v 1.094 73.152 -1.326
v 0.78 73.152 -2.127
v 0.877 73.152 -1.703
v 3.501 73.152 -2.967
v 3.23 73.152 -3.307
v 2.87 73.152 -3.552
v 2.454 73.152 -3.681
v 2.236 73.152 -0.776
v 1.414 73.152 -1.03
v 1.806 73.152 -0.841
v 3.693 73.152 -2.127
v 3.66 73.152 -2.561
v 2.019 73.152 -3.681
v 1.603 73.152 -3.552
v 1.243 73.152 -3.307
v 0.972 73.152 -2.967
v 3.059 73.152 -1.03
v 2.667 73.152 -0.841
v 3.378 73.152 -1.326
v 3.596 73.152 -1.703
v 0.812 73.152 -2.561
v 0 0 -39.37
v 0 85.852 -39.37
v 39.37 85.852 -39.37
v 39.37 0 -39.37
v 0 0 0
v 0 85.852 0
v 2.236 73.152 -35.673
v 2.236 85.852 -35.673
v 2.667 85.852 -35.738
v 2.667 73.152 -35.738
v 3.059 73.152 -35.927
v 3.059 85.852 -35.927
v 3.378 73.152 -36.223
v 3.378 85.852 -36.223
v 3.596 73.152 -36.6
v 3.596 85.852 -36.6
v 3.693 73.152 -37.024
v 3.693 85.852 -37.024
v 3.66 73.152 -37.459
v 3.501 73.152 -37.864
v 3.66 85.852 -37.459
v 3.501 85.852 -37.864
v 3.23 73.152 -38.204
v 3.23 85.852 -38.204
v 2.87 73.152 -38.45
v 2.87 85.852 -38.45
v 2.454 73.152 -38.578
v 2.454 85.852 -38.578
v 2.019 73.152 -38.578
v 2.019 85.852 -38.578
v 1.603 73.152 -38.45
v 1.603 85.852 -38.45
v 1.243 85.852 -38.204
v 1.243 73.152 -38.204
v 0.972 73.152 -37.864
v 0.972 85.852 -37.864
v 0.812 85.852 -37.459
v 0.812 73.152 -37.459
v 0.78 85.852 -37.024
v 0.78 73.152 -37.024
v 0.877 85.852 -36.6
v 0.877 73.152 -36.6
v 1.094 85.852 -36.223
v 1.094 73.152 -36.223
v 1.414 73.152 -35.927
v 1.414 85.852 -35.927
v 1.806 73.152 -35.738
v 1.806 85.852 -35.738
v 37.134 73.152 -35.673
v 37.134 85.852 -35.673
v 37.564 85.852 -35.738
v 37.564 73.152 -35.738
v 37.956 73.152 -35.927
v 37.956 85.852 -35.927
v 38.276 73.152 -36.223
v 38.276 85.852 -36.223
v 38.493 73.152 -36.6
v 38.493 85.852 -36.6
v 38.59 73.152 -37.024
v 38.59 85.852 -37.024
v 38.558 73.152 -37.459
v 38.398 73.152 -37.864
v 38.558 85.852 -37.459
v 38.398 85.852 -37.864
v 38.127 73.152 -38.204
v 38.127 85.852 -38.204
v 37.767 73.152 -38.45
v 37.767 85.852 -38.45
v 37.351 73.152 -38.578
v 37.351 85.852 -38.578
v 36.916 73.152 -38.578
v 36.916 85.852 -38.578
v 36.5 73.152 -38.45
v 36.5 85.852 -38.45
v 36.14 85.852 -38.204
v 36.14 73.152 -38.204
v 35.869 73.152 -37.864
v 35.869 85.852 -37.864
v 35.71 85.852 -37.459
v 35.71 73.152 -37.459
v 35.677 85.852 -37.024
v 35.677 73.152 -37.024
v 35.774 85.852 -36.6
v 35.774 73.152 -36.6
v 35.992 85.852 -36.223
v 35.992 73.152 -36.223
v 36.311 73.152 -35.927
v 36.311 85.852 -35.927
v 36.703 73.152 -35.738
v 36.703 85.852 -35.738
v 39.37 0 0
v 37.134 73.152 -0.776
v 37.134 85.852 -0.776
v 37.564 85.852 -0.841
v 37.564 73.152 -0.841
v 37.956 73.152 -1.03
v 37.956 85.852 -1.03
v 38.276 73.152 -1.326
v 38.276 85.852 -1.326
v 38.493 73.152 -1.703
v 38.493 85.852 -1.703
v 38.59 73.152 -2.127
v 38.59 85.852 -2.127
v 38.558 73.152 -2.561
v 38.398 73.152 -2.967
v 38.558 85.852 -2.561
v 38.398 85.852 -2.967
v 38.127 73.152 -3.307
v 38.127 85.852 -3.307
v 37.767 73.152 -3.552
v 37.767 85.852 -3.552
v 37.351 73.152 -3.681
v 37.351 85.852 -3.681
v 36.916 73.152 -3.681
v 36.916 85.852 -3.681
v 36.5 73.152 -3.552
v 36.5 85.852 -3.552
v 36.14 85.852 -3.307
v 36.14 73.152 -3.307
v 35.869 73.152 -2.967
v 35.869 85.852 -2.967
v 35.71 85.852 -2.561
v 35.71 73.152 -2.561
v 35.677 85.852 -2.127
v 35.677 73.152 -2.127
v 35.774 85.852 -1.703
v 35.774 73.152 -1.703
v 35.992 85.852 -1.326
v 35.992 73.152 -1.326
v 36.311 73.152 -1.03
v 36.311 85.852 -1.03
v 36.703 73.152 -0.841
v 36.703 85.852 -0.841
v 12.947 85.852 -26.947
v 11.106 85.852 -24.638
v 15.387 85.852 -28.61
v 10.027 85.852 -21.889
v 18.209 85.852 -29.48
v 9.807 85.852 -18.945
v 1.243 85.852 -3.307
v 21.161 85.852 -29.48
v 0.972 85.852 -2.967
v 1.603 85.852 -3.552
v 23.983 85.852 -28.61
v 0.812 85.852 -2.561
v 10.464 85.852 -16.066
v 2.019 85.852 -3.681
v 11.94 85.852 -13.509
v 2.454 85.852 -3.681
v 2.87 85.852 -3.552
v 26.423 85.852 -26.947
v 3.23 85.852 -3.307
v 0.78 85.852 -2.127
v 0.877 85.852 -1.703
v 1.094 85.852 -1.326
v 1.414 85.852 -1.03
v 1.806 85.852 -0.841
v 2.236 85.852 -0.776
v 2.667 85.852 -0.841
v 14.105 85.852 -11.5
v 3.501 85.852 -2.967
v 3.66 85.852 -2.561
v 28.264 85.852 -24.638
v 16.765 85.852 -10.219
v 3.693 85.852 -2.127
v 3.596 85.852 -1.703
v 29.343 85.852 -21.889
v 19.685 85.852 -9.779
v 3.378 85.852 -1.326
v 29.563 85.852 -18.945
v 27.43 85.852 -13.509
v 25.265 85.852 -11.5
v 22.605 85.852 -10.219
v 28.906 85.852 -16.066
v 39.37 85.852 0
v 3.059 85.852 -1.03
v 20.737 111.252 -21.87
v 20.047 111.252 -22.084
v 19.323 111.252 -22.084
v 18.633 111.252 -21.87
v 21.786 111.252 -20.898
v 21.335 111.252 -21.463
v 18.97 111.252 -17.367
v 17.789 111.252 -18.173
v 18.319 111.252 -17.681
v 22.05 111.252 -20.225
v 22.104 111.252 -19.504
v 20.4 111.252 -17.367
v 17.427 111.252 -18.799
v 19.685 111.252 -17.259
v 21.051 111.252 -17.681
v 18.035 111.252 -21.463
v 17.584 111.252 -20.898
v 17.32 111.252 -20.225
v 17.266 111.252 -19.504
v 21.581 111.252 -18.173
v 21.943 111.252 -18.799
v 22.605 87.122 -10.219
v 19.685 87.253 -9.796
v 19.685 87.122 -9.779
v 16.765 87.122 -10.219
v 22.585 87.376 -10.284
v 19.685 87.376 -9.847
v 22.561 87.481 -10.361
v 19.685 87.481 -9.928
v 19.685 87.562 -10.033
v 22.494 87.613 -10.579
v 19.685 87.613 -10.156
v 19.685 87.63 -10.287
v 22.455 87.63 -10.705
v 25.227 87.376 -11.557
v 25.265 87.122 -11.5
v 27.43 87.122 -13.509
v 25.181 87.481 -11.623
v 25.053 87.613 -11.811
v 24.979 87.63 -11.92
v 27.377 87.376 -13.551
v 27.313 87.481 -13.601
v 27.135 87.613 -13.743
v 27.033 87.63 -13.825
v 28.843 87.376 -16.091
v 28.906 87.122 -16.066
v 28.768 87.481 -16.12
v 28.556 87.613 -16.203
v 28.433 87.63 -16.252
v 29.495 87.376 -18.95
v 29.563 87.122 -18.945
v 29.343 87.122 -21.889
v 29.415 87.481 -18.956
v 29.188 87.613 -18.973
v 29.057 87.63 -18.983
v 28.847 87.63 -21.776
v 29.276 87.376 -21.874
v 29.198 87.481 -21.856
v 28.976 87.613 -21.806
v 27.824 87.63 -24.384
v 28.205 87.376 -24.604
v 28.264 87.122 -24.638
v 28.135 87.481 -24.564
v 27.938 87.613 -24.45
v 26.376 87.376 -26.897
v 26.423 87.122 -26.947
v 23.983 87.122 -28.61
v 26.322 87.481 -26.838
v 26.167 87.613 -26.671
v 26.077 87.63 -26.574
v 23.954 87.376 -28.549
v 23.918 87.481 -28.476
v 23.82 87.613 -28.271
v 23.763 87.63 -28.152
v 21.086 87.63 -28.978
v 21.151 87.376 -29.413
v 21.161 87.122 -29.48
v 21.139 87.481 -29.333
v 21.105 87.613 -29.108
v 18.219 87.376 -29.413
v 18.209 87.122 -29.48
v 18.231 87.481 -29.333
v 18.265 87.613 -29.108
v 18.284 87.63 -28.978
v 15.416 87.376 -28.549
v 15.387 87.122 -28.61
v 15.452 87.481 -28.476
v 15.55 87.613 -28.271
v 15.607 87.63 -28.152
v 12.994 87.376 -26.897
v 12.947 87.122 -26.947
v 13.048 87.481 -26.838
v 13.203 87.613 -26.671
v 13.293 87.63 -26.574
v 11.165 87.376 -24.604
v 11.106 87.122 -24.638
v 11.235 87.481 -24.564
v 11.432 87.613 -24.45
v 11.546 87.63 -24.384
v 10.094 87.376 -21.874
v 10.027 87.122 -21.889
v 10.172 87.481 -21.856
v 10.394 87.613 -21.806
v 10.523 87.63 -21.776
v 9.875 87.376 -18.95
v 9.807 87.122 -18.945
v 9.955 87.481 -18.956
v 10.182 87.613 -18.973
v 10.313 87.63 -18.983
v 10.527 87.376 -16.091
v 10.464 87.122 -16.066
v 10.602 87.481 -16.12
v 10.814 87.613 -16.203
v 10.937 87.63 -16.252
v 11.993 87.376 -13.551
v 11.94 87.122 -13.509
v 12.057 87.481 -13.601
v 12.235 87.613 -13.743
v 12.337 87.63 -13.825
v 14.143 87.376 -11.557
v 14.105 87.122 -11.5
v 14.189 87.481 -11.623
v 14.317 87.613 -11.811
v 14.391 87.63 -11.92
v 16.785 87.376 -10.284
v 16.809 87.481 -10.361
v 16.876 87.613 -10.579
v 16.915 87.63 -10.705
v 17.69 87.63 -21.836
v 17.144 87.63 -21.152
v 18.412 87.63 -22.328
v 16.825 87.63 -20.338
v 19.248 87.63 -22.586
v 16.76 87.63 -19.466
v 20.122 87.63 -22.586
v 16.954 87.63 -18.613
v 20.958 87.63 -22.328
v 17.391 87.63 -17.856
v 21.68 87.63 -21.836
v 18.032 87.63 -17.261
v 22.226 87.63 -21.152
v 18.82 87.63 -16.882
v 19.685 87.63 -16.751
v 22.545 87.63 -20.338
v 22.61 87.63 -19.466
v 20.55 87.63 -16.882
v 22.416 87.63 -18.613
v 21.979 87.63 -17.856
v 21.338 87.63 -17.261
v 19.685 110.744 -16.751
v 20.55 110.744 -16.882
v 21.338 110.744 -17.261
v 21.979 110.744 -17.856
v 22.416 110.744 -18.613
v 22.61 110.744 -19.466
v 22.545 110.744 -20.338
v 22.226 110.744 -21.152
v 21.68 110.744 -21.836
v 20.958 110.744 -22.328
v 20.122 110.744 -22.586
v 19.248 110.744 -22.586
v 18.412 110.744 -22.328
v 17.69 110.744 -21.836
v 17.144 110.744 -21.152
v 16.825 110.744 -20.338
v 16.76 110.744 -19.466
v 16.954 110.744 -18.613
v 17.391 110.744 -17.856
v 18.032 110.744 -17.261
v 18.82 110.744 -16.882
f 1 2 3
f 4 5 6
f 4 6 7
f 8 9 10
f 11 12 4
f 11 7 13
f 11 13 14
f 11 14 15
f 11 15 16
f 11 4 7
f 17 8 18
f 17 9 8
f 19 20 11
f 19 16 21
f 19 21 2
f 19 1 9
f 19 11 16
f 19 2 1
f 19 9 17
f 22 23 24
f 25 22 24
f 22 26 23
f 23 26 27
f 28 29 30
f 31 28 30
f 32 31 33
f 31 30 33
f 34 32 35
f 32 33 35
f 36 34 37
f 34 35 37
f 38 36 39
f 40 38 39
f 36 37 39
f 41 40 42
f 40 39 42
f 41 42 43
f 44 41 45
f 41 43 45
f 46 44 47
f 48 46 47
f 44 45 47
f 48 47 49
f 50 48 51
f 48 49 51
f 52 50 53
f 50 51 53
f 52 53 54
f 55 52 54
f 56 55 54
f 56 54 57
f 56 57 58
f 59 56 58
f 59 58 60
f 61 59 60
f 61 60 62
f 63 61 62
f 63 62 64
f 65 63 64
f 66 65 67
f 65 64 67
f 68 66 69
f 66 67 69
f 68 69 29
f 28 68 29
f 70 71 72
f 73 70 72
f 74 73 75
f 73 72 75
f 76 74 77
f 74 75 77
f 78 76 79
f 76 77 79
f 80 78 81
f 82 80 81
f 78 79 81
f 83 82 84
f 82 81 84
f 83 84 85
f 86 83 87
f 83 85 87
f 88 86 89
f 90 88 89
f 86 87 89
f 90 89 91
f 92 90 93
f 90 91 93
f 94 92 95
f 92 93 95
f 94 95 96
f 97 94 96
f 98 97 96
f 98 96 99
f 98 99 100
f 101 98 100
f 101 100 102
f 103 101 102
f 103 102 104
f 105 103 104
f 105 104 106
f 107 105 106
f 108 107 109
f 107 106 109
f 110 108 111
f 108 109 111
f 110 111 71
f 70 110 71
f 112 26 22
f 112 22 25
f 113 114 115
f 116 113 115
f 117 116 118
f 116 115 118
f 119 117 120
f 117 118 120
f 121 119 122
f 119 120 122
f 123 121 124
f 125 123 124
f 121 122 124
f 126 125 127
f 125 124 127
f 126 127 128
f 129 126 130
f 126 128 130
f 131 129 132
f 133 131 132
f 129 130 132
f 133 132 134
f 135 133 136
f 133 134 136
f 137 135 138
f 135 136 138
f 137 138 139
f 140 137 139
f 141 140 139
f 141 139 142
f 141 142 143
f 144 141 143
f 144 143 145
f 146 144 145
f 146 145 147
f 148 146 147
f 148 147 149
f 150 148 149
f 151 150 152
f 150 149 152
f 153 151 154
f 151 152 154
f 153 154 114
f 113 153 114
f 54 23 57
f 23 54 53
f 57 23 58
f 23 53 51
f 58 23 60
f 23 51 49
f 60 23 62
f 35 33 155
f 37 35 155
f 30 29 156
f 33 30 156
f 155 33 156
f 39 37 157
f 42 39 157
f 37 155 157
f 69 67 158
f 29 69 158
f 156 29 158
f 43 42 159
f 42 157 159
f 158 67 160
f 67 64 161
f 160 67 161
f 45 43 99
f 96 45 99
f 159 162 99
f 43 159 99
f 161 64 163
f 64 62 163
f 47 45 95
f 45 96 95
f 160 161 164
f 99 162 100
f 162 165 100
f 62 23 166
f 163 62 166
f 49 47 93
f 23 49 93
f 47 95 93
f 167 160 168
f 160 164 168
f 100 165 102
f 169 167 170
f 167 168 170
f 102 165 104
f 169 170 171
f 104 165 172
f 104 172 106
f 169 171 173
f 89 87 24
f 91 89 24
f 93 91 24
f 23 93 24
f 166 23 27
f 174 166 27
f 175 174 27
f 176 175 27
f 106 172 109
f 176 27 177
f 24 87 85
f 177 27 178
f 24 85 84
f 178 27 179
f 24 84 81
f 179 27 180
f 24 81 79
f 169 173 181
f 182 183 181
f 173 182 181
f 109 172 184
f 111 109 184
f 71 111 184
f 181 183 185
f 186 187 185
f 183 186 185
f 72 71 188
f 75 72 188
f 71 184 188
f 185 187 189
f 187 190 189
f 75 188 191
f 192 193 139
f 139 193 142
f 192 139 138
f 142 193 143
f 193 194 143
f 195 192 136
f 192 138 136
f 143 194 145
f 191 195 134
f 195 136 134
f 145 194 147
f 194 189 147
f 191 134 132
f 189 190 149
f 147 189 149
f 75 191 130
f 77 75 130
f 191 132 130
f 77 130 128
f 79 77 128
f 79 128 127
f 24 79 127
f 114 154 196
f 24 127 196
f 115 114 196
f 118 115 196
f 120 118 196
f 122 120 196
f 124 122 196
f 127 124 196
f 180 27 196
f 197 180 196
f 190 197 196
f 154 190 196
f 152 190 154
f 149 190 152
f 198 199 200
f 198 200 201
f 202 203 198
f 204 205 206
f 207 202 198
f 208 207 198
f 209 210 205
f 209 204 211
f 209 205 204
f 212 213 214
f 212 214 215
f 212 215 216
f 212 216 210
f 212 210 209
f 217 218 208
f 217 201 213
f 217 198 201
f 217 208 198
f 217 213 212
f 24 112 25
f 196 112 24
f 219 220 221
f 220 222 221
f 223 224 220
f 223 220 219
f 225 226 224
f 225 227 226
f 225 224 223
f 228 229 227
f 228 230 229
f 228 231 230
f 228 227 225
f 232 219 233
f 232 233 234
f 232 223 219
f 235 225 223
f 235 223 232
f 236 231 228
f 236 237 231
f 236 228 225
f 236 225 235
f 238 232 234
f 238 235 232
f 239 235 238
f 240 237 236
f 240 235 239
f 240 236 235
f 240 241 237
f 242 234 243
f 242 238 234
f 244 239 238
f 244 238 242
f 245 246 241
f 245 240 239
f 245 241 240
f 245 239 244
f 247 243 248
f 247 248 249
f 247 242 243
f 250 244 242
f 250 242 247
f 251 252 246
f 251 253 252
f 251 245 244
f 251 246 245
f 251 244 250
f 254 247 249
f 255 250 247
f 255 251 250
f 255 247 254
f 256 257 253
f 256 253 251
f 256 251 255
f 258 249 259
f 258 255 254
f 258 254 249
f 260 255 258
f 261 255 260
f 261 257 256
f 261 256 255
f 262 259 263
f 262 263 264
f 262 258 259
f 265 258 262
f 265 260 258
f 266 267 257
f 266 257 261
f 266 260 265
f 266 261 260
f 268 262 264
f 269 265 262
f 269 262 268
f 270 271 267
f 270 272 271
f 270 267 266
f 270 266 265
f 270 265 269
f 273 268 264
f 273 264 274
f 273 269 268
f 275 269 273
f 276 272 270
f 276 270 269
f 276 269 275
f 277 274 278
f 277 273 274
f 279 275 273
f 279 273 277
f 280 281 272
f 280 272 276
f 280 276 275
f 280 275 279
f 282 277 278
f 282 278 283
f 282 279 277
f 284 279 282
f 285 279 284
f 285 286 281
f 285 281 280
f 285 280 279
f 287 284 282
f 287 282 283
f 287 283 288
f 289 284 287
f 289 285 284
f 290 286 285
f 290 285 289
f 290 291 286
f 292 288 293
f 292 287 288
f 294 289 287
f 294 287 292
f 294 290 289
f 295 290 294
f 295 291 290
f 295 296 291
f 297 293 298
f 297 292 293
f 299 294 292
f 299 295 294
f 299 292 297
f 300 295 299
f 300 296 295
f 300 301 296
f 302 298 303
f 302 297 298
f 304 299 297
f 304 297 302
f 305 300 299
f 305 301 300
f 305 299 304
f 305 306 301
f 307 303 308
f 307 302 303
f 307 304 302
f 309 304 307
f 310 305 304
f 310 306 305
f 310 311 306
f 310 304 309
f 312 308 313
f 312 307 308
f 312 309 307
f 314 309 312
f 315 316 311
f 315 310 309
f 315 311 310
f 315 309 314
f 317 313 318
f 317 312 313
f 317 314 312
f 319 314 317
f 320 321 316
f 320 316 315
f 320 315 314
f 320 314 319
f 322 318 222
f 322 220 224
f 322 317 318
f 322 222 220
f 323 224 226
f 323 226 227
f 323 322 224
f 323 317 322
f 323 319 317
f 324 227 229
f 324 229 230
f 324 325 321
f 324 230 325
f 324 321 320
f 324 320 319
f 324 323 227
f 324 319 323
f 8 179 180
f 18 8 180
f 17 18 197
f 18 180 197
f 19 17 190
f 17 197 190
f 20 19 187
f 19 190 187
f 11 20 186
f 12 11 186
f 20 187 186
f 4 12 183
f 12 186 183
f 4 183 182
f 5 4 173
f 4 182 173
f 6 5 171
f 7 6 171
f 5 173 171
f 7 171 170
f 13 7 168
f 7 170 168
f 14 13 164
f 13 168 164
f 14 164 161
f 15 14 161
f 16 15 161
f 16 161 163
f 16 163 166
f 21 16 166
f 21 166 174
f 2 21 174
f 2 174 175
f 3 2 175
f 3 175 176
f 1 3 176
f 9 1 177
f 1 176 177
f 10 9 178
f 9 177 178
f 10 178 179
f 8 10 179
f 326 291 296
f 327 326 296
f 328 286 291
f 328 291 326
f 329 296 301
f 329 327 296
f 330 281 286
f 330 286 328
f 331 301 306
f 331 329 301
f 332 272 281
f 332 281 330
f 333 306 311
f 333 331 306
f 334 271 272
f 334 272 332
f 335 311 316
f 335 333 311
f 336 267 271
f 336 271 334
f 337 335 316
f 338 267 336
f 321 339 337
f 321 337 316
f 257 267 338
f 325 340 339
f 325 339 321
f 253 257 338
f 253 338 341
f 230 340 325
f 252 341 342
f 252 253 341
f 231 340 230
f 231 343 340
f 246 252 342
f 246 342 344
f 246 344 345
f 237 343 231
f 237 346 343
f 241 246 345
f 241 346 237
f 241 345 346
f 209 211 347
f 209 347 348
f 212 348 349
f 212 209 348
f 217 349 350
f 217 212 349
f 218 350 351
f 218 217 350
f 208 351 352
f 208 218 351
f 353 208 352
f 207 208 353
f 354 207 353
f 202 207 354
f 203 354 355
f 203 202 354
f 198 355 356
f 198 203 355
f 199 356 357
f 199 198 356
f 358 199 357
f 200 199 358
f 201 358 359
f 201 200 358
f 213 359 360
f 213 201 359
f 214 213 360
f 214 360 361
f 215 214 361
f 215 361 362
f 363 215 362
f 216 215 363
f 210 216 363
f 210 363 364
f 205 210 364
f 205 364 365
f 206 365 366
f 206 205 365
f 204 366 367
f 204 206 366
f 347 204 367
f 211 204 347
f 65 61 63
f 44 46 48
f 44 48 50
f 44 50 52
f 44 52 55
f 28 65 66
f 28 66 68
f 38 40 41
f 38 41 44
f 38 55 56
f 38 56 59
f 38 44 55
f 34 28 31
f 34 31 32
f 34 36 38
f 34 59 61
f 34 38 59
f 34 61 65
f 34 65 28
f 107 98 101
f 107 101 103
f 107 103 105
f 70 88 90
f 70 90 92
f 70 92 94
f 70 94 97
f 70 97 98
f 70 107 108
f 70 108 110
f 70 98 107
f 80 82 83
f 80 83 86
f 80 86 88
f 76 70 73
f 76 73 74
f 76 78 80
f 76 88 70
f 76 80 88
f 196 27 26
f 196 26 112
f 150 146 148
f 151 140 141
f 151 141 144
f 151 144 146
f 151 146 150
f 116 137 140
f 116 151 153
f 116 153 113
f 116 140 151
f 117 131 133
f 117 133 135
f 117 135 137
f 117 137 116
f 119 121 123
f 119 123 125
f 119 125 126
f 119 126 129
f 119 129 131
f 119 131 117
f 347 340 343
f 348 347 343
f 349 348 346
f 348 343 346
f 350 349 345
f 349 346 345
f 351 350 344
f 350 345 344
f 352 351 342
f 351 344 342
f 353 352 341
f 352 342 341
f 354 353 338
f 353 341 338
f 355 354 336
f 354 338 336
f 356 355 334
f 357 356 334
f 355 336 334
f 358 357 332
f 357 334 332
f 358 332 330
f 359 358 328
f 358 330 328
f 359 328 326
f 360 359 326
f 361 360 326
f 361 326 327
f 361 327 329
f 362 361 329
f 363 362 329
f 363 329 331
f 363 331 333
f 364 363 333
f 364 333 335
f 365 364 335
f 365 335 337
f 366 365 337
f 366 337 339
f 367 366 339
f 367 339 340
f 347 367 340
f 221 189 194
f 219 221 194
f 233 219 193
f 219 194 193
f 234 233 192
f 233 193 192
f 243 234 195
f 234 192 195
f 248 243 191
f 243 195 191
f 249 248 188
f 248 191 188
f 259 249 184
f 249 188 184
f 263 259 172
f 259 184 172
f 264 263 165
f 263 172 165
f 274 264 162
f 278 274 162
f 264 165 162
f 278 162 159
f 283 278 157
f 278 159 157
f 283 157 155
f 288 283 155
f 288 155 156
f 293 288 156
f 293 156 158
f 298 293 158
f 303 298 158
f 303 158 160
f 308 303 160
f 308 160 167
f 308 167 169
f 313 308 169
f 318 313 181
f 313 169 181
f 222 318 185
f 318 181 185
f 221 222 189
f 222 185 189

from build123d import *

# Parameters (mm, degrees)
SKETCH1_W      = 39.37
SKETCH1_H      = 85.852
EXTRUDE1_DEPTH = 39.37
SKETCH2_R      = 2.9337
EXTRUDE2_DEPTH = 25.4
CHAMFER1_SIZE  = 0.508
SKETCH4_R      = 9.906
EXTRUDE3_DEPTH = 1.778
FILLET3_R      = 0.508
SKETCH5_R      = 1.4605
EXTRUDE4_DEPTH = 12.7


with BuildPart() as part:
    # Sketch1 → Extrude1 (new body)
    with BuildSketch(Plane.XY):
        with Locations((19.685, 42.926)):
            Rectangle(SKETCH1_W, SKETCH1_H)
    extrude(amount=-EXTRUDE1_DEPTH)

    # Sketch2 → Extrude2 (add)
    with BuildSketch(Plane(origin=(0, 85.852, 0), x_dir=(1, 0, 0), z_dir=(0, 1, 0))):
        with Locations(Location((19.685, 19.685, 0), (0, 0, 270))):
            Circle(SKETCH2_R)
    extrude(amount=EXTRUDE2_DEPTH)

    # Chamfer1
    chamfer1_edges = [part.edges().sort_by_distance(p)[0] for p in [
        (19.685, 111.252, -22.6187),
    ]]
    chamfer(chamfer1_edges, length=CHAMFER1_SIZE)

    # Sketch4 → Extrude3 (add)
    with BuildSketch(Plane(origin=(0, 85.852, 0), x_dir=(1, 0, 0), z_dir=(0, 1, 0))):
        with Locations(Location((19.685, 19.685, 0), (0, 0, 270))):
            Circle(SKETCH4_R)
    extrude(amount=EXTRUDE3_DEPTH)

    # Fillet3
    fillet3_edges = [part.edges().sort_by_distance(p)[0] for p in [
        (19.685, 87.63, -29.591),
    ]]
    fillet(fillet3_edges, radius=FILLET3_R)

    # Sketch5 → Extrude4 (cut)
    with BuildSketch(Plane(origin=(0, 85.852, 0), x_dir=(1, 0, 0), z_dir=(0, 1, 0))):
        with Locations(Location((2.236362357, 37.133637643, 0), (0, 0, 270))):
            Circle(SKETCH5_R)
        with Locations(Location((37.133637643, 37.133637643, 0), (0, 0, 270))):
            Circle(SKETCH5_R)
        with Locations(Location((37.133637643, 2.236362357, 0), (0, 0, 270))):
            Circle(SKETCH5_R)
        with Locations(Location((2.236362357, 2.236362357, 0), (0, 0, 270))):
            Circle(SKETCH5_R)
    extrude(amount=-EXTRUDE4_DEPTH, mode=Mode.SUBTRACT)


solid = part.part
